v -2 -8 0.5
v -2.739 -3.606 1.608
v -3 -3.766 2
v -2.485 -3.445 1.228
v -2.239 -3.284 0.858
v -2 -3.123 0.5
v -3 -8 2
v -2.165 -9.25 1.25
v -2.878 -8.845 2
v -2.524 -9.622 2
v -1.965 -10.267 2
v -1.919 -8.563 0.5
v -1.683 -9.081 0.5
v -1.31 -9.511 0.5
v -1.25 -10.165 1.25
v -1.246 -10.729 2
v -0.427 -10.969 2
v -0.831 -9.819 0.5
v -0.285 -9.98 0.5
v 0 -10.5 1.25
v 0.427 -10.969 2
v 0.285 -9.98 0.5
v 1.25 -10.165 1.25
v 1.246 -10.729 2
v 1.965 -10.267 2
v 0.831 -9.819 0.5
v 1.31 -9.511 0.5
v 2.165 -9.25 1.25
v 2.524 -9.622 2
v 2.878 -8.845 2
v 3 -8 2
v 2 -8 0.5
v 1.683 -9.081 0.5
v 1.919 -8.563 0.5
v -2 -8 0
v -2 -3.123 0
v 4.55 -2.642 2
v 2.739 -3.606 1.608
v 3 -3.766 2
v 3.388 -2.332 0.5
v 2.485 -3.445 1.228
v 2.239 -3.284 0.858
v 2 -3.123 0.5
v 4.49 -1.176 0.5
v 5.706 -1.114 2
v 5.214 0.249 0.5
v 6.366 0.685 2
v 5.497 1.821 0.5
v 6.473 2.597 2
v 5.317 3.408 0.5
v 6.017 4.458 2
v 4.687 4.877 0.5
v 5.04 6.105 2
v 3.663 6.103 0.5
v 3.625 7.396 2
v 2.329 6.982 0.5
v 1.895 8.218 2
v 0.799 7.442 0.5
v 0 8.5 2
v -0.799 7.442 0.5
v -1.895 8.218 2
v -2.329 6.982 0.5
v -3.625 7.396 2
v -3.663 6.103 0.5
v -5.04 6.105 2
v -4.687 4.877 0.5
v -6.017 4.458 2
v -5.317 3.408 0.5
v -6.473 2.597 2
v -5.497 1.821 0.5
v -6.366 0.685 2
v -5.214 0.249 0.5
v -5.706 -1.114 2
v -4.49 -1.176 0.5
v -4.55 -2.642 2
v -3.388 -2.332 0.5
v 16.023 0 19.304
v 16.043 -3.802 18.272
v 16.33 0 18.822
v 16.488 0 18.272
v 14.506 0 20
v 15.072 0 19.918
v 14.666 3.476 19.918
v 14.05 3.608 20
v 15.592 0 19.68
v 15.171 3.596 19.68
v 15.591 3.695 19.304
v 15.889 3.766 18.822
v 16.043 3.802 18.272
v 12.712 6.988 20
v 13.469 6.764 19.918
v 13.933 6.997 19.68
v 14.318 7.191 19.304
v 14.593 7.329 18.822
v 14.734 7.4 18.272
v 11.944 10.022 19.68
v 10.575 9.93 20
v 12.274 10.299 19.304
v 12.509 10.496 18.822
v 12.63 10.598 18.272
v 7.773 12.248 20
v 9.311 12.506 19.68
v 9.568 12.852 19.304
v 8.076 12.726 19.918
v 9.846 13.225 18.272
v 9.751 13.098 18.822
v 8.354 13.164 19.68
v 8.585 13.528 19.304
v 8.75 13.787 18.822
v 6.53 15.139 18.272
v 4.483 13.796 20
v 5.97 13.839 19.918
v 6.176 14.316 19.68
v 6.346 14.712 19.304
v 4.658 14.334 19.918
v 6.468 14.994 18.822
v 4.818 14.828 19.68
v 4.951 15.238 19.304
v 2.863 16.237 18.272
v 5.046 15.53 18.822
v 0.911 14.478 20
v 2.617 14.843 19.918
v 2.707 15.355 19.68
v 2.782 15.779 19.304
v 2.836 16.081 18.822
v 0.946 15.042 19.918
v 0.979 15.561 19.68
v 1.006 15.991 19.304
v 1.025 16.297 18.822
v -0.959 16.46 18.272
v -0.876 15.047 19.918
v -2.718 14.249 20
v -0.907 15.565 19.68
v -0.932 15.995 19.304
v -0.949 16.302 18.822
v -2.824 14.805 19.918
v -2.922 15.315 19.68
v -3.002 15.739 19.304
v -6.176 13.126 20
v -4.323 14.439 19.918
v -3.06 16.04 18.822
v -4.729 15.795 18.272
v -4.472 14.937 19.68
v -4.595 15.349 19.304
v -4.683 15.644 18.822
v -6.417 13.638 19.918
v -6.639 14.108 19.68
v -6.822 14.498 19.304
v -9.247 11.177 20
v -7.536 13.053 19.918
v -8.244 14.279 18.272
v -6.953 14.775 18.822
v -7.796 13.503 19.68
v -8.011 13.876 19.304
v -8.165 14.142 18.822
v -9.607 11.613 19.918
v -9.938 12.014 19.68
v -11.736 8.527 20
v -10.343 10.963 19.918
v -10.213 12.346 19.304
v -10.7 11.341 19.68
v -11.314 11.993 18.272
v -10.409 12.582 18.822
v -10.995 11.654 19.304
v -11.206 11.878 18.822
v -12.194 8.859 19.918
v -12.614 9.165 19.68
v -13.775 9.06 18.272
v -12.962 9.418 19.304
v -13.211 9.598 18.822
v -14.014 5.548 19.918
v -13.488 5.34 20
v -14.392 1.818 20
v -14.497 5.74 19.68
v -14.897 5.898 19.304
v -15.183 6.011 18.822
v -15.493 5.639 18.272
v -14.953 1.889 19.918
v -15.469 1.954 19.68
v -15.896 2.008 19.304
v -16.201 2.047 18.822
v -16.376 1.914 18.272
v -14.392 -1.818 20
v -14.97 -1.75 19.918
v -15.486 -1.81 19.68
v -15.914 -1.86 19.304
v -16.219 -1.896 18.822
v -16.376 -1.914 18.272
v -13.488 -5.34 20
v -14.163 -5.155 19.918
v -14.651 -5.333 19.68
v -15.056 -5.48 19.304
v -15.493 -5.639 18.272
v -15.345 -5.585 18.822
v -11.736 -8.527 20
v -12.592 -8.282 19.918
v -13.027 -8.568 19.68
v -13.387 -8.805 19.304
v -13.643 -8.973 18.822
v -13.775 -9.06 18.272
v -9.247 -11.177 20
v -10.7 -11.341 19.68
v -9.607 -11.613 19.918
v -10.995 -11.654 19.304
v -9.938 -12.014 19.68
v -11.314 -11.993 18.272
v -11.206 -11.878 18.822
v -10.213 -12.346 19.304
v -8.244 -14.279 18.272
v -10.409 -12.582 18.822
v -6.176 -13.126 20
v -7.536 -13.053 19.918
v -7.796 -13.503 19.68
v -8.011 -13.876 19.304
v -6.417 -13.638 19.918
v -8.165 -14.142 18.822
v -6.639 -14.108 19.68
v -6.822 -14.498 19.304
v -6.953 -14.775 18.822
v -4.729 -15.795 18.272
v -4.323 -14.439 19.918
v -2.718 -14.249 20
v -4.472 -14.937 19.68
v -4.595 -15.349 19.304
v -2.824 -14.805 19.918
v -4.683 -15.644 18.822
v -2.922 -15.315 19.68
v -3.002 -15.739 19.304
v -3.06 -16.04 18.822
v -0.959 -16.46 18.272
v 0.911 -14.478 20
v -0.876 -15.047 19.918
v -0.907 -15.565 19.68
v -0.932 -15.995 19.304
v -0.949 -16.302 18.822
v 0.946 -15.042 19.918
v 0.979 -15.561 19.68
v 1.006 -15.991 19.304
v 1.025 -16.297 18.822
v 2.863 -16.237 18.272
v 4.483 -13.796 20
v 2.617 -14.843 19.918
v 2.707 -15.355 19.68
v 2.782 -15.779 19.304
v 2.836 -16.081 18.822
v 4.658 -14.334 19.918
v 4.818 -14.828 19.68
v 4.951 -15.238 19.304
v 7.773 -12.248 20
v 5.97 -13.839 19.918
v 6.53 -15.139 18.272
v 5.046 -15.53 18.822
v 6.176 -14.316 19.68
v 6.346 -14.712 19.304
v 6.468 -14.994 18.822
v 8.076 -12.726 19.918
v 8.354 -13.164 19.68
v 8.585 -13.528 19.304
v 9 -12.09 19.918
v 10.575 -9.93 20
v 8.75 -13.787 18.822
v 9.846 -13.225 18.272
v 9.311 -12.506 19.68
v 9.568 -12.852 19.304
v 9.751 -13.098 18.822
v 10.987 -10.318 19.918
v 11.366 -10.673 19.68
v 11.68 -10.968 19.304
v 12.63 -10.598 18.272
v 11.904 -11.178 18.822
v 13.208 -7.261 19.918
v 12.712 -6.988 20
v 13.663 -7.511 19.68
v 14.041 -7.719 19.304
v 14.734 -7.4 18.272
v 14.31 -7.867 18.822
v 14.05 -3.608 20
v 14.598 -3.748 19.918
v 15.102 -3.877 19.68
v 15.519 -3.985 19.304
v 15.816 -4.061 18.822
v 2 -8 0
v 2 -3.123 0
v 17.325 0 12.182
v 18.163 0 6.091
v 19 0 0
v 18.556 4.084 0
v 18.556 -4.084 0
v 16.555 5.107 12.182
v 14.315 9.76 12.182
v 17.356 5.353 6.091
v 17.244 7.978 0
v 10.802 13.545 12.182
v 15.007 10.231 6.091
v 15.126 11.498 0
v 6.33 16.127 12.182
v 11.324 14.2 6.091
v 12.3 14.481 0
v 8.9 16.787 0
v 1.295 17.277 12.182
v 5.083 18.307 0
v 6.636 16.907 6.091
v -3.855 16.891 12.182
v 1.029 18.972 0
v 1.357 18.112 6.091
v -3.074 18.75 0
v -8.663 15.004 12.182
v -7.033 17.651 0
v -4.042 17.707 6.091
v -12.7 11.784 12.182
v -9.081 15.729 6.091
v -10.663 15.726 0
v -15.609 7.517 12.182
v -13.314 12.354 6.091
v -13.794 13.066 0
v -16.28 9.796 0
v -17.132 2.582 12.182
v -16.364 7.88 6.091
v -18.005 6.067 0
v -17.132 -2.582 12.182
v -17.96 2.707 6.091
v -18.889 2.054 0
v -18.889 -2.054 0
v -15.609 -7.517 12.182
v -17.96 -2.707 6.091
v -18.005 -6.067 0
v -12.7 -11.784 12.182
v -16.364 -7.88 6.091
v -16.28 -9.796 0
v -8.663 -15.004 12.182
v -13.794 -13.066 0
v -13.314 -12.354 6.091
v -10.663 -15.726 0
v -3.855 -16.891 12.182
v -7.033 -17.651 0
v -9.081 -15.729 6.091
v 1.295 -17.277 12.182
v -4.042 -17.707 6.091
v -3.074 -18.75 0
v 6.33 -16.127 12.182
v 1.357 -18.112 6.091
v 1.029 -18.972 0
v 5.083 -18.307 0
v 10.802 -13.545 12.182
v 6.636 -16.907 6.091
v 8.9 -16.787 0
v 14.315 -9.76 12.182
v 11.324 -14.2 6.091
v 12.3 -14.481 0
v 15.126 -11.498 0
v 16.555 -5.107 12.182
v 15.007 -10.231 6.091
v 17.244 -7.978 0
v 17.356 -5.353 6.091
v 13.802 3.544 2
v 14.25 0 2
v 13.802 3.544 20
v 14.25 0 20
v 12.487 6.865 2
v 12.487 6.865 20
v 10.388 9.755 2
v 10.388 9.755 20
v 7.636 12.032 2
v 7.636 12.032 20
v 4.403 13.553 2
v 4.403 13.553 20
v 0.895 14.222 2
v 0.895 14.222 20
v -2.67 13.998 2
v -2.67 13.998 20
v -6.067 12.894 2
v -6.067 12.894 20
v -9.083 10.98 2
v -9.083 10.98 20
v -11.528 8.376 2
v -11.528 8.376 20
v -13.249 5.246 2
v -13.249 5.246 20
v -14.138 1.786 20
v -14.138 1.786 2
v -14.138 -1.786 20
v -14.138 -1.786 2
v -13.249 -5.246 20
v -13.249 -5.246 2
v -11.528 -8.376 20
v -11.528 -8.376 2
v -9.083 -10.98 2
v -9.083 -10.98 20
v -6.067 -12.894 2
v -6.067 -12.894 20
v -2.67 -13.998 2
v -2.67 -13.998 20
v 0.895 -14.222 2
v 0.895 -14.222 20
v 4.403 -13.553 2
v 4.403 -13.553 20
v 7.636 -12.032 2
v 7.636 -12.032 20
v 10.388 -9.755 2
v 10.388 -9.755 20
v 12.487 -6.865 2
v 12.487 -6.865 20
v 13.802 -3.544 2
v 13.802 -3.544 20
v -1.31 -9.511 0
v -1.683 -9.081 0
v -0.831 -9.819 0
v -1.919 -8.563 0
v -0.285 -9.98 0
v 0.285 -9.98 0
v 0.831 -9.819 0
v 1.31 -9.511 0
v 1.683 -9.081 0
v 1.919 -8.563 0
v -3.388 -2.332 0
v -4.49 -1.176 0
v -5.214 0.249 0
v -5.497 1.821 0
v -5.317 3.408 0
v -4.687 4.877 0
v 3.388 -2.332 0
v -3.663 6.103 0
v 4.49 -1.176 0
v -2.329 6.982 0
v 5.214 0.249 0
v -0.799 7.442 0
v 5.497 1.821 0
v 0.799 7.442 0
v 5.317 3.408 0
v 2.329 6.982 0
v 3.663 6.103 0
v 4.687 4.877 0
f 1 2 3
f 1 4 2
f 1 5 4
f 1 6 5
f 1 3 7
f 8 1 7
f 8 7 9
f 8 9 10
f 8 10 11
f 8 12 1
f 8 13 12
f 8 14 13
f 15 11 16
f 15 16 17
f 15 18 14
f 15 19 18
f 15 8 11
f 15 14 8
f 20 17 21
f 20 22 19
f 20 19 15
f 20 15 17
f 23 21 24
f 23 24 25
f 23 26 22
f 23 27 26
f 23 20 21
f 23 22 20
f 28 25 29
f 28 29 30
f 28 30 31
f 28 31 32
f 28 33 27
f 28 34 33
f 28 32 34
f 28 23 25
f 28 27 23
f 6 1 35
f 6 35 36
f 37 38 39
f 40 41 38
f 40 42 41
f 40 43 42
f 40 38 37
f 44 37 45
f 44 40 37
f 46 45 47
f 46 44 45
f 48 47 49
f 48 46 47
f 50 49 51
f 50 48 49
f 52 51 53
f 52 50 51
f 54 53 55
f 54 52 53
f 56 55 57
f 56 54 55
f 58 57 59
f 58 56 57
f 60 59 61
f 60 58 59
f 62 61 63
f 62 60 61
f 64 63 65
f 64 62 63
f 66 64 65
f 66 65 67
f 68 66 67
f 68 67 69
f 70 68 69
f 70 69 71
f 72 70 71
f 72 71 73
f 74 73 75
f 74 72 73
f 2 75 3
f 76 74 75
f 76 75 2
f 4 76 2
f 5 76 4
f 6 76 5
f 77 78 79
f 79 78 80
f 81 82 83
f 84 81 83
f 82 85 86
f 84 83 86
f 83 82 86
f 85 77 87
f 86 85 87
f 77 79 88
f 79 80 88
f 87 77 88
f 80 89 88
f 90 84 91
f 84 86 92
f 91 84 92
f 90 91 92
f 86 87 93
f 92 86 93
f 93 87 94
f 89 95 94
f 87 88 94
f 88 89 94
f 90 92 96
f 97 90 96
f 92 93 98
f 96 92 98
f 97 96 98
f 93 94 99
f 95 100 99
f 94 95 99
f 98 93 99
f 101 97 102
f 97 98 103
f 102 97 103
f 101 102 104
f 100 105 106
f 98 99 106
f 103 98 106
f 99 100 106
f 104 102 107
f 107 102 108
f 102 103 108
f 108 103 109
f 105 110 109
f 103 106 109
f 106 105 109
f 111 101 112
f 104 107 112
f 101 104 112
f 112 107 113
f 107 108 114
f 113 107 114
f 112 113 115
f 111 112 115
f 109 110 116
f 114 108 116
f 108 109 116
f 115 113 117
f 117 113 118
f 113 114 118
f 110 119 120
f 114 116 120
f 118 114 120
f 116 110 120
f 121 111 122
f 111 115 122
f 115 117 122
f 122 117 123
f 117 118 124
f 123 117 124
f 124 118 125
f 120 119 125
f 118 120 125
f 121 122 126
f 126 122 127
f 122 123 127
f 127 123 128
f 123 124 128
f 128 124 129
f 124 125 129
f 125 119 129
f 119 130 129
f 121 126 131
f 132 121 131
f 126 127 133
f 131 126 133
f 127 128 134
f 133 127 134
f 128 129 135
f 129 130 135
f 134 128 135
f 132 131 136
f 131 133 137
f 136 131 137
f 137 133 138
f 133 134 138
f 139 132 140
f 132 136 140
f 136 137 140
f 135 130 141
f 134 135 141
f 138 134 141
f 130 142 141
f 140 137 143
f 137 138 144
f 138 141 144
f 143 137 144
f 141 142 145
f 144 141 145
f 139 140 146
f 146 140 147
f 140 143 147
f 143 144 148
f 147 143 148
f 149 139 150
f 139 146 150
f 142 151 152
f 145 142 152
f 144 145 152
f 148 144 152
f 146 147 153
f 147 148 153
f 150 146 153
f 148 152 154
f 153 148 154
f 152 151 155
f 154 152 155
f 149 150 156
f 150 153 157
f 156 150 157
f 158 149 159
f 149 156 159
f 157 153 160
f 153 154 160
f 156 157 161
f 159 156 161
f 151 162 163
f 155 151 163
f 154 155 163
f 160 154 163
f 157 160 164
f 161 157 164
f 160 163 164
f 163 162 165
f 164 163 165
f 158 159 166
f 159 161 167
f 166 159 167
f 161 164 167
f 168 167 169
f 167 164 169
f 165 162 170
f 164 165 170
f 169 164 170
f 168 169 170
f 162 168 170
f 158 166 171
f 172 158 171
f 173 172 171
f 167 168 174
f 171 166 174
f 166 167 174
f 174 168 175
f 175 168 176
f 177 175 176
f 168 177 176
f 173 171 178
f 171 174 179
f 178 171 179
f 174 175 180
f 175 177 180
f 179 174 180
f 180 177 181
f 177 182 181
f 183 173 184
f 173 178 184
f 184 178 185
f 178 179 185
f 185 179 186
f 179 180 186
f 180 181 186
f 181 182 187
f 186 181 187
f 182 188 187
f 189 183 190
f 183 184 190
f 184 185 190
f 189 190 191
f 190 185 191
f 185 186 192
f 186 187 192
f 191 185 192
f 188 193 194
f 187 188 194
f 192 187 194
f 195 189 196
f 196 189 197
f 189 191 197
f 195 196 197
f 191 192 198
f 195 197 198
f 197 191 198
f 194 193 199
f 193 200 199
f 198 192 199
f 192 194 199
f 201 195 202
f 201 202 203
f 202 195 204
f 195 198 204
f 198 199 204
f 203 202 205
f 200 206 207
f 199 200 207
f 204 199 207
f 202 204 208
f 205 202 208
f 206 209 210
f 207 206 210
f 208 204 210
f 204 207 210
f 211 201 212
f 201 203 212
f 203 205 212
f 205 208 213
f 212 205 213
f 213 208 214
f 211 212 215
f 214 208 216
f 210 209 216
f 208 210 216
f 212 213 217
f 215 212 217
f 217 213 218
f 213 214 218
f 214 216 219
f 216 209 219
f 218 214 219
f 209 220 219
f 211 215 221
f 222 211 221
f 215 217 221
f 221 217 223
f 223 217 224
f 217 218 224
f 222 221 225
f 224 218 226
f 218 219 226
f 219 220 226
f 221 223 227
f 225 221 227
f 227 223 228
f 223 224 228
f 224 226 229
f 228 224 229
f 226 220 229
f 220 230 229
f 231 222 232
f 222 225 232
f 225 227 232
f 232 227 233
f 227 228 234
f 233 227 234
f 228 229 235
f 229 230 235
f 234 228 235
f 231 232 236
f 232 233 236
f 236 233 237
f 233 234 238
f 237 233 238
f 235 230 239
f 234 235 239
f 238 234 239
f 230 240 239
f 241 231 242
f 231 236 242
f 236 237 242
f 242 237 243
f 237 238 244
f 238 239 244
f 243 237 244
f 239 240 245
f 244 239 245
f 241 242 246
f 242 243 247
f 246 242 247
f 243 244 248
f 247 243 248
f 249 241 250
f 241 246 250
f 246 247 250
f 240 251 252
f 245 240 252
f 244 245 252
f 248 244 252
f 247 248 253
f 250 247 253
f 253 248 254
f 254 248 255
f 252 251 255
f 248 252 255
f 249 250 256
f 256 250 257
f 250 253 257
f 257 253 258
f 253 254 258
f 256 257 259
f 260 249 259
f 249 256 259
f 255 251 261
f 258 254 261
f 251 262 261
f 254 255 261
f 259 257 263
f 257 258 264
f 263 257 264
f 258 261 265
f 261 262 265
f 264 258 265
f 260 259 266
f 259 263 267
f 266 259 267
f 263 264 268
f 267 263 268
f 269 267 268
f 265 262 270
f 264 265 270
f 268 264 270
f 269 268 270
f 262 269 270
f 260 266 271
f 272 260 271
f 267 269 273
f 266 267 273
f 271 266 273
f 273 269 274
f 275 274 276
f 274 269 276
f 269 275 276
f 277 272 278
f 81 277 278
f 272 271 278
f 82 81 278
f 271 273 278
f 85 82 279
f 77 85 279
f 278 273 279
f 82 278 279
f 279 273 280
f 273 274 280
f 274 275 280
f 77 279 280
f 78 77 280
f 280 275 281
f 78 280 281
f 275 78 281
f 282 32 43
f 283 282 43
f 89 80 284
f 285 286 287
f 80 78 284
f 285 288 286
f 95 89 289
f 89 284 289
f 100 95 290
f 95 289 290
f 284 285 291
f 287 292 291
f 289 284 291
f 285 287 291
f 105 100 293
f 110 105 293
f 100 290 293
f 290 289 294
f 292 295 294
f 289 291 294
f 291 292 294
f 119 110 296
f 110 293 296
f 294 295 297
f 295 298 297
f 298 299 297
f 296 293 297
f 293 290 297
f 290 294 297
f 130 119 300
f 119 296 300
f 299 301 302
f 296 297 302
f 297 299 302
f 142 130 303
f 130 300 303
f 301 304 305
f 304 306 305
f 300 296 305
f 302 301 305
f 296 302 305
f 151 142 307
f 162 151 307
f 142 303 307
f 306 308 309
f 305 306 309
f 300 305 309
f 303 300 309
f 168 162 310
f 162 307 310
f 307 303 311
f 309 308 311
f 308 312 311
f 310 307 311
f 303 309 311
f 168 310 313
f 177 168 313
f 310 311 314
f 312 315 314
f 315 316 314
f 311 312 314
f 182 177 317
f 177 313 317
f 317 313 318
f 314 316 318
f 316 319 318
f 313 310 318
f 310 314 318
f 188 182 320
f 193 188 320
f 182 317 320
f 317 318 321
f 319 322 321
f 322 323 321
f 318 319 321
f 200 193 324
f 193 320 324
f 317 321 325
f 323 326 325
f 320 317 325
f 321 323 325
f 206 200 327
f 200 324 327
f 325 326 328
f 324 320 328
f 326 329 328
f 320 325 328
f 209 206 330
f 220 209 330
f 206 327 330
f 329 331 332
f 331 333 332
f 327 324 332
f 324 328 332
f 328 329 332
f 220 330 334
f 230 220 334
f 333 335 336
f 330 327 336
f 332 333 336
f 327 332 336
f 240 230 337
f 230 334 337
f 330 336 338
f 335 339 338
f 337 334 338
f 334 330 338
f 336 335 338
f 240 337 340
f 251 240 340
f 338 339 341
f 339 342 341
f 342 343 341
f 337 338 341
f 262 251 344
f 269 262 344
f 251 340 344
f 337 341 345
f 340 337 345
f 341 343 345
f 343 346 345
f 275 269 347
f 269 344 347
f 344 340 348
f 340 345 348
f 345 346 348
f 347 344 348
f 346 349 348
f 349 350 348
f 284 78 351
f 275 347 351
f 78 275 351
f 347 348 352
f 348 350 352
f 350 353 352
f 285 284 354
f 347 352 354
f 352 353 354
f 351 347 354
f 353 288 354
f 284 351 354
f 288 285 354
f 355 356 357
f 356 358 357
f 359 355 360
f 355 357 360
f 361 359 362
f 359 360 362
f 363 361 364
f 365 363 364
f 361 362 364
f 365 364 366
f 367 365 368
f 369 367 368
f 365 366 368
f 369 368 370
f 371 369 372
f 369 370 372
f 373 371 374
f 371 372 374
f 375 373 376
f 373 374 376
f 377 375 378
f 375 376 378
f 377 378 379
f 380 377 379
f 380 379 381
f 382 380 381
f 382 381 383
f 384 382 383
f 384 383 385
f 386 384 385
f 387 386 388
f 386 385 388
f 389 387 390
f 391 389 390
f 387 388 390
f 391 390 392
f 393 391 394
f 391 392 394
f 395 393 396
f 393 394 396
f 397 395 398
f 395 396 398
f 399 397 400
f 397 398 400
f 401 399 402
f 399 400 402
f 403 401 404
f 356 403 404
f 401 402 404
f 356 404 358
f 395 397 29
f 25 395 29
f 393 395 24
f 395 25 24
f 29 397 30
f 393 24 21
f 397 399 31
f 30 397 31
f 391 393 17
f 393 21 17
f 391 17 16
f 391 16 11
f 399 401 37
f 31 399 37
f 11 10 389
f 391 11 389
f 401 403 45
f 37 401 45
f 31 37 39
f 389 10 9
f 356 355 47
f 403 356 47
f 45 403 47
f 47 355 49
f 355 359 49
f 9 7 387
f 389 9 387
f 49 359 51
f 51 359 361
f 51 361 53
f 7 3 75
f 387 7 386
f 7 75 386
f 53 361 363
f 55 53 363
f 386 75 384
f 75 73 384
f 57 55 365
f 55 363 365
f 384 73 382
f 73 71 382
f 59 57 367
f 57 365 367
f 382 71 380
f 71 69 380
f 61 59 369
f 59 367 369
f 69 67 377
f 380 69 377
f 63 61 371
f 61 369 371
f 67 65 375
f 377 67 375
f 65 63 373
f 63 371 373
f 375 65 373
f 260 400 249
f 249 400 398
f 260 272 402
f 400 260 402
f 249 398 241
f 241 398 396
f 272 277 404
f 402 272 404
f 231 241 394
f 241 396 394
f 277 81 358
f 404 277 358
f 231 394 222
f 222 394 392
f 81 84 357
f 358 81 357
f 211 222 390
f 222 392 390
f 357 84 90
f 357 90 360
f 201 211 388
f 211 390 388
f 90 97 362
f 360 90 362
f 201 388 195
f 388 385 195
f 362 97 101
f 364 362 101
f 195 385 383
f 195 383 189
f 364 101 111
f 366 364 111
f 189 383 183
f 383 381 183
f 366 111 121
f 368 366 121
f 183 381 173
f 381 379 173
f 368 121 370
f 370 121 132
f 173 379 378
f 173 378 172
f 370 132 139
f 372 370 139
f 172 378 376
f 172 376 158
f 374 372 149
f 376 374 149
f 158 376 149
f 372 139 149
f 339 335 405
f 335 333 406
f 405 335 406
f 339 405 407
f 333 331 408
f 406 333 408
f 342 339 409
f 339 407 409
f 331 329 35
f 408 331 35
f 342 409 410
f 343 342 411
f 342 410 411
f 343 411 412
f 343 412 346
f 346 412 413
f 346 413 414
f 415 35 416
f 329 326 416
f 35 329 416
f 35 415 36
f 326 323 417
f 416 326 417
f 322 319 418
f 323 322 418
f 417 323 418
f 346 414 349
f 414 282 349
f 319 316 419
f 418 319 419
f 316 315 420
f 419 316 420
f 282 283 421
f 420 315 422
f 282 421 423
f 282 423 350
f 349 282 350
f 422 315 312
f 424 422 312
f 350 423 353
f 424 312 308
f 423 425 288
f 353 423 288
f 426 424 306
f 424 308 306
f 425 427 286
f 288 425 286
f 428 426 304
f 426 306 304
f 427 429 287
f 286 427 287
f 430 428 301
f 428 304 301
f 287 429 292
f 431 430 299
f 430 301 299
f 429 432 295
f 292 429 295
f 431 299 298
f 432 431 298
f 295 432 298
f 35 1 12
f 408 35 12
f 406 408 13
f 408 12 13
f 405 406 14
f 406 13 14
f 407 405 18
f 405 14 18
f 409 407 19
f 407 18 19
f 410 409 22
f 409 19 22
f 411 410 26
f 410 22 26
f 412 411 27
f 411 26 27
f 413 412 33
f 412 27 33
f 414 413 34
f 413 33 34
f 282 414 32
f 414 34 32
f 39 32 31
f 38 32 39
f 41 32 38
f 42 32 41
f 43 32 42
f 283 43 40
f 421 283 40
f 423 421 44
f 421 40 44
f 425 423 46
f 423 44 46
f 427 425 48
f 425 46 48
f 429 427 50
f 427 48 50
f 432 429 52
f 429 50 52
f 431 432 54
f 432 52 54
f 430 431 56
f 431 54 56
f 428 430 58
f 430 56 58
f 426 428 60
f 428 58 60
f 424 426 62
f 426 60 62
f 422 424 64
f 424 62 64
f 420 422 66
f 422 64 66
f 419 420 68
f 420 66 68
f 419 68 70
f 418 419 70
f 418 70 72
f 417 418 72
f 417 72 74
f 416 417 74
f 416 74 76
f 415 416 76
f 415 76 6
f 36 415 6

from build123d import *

# Parameters (mm, degrees)
SKETCH001_R   = 5.5
POCKET_DEPTH  = 2.001
FILLET_R      = 2
CHAMFER_SIZE2 = 1.5
CHAMFER_SIZE  = 1


with BuildPart() as part:
    # Sketch → Revolution (revolve)
    with BuildSketch(Plane.XZ):
        Polygon((0, 0), (0, 2), (14.25, 2), (14.25, 20), (16.25, 20), (19, 0), align=None)
    revolve(axis=Axis((0, 0, 0), (0, 0, 1)))

    # Sketch001 (on Face1 of Revolution) → Pocket (cut, through all)
    with BuildSketch(Plane(origin=(0, 0, 2), x_dir=(-1, 0, 0), z_dir=(0, 0, 1))):
        with Locations((0, -2)):
            Circle(SKETCH001_R)
        with BuildLine():
            ThreePointArc((2, 8), (0, 10), (-2, 8))
            Line((-2, 8), (-2, -2))
            ThreePointArc((-2, -2), (0, -4), (2, -2))
            Line((2, 8), (2, -2))
        make_face()
    extrude(amount=-POCKET_DEPTH, mode=Mode.SUBTRACT)

    # Fillet
    fillet_edges = [part.edges().sort_by_distance(p)[0] for p in [
        (-16.25, 0, 20),
    ]]
    fillet(fillet_edges, radius=FILLET_R)

    # Chamfer
    chamfer_edges = [part.edges().sort_by_distance(p)[0] for p in [
        (-4.541476, -1.102418, 2),
        (3.102418, 6.541476, 2),
        (2, -5.561738, 2),
        (0, -10, 2),
        (-2, -5.561738, 2),
    ]]
    chamfer_side = part.faces().sort_by_distance((-13.846949, 0, 2))[0]
    chamfer(chamfer_edges, length=CHAMFER_SIZE, length2=CHAMFER_SIZE2, reference=chamfer_side)


solid = part.part
